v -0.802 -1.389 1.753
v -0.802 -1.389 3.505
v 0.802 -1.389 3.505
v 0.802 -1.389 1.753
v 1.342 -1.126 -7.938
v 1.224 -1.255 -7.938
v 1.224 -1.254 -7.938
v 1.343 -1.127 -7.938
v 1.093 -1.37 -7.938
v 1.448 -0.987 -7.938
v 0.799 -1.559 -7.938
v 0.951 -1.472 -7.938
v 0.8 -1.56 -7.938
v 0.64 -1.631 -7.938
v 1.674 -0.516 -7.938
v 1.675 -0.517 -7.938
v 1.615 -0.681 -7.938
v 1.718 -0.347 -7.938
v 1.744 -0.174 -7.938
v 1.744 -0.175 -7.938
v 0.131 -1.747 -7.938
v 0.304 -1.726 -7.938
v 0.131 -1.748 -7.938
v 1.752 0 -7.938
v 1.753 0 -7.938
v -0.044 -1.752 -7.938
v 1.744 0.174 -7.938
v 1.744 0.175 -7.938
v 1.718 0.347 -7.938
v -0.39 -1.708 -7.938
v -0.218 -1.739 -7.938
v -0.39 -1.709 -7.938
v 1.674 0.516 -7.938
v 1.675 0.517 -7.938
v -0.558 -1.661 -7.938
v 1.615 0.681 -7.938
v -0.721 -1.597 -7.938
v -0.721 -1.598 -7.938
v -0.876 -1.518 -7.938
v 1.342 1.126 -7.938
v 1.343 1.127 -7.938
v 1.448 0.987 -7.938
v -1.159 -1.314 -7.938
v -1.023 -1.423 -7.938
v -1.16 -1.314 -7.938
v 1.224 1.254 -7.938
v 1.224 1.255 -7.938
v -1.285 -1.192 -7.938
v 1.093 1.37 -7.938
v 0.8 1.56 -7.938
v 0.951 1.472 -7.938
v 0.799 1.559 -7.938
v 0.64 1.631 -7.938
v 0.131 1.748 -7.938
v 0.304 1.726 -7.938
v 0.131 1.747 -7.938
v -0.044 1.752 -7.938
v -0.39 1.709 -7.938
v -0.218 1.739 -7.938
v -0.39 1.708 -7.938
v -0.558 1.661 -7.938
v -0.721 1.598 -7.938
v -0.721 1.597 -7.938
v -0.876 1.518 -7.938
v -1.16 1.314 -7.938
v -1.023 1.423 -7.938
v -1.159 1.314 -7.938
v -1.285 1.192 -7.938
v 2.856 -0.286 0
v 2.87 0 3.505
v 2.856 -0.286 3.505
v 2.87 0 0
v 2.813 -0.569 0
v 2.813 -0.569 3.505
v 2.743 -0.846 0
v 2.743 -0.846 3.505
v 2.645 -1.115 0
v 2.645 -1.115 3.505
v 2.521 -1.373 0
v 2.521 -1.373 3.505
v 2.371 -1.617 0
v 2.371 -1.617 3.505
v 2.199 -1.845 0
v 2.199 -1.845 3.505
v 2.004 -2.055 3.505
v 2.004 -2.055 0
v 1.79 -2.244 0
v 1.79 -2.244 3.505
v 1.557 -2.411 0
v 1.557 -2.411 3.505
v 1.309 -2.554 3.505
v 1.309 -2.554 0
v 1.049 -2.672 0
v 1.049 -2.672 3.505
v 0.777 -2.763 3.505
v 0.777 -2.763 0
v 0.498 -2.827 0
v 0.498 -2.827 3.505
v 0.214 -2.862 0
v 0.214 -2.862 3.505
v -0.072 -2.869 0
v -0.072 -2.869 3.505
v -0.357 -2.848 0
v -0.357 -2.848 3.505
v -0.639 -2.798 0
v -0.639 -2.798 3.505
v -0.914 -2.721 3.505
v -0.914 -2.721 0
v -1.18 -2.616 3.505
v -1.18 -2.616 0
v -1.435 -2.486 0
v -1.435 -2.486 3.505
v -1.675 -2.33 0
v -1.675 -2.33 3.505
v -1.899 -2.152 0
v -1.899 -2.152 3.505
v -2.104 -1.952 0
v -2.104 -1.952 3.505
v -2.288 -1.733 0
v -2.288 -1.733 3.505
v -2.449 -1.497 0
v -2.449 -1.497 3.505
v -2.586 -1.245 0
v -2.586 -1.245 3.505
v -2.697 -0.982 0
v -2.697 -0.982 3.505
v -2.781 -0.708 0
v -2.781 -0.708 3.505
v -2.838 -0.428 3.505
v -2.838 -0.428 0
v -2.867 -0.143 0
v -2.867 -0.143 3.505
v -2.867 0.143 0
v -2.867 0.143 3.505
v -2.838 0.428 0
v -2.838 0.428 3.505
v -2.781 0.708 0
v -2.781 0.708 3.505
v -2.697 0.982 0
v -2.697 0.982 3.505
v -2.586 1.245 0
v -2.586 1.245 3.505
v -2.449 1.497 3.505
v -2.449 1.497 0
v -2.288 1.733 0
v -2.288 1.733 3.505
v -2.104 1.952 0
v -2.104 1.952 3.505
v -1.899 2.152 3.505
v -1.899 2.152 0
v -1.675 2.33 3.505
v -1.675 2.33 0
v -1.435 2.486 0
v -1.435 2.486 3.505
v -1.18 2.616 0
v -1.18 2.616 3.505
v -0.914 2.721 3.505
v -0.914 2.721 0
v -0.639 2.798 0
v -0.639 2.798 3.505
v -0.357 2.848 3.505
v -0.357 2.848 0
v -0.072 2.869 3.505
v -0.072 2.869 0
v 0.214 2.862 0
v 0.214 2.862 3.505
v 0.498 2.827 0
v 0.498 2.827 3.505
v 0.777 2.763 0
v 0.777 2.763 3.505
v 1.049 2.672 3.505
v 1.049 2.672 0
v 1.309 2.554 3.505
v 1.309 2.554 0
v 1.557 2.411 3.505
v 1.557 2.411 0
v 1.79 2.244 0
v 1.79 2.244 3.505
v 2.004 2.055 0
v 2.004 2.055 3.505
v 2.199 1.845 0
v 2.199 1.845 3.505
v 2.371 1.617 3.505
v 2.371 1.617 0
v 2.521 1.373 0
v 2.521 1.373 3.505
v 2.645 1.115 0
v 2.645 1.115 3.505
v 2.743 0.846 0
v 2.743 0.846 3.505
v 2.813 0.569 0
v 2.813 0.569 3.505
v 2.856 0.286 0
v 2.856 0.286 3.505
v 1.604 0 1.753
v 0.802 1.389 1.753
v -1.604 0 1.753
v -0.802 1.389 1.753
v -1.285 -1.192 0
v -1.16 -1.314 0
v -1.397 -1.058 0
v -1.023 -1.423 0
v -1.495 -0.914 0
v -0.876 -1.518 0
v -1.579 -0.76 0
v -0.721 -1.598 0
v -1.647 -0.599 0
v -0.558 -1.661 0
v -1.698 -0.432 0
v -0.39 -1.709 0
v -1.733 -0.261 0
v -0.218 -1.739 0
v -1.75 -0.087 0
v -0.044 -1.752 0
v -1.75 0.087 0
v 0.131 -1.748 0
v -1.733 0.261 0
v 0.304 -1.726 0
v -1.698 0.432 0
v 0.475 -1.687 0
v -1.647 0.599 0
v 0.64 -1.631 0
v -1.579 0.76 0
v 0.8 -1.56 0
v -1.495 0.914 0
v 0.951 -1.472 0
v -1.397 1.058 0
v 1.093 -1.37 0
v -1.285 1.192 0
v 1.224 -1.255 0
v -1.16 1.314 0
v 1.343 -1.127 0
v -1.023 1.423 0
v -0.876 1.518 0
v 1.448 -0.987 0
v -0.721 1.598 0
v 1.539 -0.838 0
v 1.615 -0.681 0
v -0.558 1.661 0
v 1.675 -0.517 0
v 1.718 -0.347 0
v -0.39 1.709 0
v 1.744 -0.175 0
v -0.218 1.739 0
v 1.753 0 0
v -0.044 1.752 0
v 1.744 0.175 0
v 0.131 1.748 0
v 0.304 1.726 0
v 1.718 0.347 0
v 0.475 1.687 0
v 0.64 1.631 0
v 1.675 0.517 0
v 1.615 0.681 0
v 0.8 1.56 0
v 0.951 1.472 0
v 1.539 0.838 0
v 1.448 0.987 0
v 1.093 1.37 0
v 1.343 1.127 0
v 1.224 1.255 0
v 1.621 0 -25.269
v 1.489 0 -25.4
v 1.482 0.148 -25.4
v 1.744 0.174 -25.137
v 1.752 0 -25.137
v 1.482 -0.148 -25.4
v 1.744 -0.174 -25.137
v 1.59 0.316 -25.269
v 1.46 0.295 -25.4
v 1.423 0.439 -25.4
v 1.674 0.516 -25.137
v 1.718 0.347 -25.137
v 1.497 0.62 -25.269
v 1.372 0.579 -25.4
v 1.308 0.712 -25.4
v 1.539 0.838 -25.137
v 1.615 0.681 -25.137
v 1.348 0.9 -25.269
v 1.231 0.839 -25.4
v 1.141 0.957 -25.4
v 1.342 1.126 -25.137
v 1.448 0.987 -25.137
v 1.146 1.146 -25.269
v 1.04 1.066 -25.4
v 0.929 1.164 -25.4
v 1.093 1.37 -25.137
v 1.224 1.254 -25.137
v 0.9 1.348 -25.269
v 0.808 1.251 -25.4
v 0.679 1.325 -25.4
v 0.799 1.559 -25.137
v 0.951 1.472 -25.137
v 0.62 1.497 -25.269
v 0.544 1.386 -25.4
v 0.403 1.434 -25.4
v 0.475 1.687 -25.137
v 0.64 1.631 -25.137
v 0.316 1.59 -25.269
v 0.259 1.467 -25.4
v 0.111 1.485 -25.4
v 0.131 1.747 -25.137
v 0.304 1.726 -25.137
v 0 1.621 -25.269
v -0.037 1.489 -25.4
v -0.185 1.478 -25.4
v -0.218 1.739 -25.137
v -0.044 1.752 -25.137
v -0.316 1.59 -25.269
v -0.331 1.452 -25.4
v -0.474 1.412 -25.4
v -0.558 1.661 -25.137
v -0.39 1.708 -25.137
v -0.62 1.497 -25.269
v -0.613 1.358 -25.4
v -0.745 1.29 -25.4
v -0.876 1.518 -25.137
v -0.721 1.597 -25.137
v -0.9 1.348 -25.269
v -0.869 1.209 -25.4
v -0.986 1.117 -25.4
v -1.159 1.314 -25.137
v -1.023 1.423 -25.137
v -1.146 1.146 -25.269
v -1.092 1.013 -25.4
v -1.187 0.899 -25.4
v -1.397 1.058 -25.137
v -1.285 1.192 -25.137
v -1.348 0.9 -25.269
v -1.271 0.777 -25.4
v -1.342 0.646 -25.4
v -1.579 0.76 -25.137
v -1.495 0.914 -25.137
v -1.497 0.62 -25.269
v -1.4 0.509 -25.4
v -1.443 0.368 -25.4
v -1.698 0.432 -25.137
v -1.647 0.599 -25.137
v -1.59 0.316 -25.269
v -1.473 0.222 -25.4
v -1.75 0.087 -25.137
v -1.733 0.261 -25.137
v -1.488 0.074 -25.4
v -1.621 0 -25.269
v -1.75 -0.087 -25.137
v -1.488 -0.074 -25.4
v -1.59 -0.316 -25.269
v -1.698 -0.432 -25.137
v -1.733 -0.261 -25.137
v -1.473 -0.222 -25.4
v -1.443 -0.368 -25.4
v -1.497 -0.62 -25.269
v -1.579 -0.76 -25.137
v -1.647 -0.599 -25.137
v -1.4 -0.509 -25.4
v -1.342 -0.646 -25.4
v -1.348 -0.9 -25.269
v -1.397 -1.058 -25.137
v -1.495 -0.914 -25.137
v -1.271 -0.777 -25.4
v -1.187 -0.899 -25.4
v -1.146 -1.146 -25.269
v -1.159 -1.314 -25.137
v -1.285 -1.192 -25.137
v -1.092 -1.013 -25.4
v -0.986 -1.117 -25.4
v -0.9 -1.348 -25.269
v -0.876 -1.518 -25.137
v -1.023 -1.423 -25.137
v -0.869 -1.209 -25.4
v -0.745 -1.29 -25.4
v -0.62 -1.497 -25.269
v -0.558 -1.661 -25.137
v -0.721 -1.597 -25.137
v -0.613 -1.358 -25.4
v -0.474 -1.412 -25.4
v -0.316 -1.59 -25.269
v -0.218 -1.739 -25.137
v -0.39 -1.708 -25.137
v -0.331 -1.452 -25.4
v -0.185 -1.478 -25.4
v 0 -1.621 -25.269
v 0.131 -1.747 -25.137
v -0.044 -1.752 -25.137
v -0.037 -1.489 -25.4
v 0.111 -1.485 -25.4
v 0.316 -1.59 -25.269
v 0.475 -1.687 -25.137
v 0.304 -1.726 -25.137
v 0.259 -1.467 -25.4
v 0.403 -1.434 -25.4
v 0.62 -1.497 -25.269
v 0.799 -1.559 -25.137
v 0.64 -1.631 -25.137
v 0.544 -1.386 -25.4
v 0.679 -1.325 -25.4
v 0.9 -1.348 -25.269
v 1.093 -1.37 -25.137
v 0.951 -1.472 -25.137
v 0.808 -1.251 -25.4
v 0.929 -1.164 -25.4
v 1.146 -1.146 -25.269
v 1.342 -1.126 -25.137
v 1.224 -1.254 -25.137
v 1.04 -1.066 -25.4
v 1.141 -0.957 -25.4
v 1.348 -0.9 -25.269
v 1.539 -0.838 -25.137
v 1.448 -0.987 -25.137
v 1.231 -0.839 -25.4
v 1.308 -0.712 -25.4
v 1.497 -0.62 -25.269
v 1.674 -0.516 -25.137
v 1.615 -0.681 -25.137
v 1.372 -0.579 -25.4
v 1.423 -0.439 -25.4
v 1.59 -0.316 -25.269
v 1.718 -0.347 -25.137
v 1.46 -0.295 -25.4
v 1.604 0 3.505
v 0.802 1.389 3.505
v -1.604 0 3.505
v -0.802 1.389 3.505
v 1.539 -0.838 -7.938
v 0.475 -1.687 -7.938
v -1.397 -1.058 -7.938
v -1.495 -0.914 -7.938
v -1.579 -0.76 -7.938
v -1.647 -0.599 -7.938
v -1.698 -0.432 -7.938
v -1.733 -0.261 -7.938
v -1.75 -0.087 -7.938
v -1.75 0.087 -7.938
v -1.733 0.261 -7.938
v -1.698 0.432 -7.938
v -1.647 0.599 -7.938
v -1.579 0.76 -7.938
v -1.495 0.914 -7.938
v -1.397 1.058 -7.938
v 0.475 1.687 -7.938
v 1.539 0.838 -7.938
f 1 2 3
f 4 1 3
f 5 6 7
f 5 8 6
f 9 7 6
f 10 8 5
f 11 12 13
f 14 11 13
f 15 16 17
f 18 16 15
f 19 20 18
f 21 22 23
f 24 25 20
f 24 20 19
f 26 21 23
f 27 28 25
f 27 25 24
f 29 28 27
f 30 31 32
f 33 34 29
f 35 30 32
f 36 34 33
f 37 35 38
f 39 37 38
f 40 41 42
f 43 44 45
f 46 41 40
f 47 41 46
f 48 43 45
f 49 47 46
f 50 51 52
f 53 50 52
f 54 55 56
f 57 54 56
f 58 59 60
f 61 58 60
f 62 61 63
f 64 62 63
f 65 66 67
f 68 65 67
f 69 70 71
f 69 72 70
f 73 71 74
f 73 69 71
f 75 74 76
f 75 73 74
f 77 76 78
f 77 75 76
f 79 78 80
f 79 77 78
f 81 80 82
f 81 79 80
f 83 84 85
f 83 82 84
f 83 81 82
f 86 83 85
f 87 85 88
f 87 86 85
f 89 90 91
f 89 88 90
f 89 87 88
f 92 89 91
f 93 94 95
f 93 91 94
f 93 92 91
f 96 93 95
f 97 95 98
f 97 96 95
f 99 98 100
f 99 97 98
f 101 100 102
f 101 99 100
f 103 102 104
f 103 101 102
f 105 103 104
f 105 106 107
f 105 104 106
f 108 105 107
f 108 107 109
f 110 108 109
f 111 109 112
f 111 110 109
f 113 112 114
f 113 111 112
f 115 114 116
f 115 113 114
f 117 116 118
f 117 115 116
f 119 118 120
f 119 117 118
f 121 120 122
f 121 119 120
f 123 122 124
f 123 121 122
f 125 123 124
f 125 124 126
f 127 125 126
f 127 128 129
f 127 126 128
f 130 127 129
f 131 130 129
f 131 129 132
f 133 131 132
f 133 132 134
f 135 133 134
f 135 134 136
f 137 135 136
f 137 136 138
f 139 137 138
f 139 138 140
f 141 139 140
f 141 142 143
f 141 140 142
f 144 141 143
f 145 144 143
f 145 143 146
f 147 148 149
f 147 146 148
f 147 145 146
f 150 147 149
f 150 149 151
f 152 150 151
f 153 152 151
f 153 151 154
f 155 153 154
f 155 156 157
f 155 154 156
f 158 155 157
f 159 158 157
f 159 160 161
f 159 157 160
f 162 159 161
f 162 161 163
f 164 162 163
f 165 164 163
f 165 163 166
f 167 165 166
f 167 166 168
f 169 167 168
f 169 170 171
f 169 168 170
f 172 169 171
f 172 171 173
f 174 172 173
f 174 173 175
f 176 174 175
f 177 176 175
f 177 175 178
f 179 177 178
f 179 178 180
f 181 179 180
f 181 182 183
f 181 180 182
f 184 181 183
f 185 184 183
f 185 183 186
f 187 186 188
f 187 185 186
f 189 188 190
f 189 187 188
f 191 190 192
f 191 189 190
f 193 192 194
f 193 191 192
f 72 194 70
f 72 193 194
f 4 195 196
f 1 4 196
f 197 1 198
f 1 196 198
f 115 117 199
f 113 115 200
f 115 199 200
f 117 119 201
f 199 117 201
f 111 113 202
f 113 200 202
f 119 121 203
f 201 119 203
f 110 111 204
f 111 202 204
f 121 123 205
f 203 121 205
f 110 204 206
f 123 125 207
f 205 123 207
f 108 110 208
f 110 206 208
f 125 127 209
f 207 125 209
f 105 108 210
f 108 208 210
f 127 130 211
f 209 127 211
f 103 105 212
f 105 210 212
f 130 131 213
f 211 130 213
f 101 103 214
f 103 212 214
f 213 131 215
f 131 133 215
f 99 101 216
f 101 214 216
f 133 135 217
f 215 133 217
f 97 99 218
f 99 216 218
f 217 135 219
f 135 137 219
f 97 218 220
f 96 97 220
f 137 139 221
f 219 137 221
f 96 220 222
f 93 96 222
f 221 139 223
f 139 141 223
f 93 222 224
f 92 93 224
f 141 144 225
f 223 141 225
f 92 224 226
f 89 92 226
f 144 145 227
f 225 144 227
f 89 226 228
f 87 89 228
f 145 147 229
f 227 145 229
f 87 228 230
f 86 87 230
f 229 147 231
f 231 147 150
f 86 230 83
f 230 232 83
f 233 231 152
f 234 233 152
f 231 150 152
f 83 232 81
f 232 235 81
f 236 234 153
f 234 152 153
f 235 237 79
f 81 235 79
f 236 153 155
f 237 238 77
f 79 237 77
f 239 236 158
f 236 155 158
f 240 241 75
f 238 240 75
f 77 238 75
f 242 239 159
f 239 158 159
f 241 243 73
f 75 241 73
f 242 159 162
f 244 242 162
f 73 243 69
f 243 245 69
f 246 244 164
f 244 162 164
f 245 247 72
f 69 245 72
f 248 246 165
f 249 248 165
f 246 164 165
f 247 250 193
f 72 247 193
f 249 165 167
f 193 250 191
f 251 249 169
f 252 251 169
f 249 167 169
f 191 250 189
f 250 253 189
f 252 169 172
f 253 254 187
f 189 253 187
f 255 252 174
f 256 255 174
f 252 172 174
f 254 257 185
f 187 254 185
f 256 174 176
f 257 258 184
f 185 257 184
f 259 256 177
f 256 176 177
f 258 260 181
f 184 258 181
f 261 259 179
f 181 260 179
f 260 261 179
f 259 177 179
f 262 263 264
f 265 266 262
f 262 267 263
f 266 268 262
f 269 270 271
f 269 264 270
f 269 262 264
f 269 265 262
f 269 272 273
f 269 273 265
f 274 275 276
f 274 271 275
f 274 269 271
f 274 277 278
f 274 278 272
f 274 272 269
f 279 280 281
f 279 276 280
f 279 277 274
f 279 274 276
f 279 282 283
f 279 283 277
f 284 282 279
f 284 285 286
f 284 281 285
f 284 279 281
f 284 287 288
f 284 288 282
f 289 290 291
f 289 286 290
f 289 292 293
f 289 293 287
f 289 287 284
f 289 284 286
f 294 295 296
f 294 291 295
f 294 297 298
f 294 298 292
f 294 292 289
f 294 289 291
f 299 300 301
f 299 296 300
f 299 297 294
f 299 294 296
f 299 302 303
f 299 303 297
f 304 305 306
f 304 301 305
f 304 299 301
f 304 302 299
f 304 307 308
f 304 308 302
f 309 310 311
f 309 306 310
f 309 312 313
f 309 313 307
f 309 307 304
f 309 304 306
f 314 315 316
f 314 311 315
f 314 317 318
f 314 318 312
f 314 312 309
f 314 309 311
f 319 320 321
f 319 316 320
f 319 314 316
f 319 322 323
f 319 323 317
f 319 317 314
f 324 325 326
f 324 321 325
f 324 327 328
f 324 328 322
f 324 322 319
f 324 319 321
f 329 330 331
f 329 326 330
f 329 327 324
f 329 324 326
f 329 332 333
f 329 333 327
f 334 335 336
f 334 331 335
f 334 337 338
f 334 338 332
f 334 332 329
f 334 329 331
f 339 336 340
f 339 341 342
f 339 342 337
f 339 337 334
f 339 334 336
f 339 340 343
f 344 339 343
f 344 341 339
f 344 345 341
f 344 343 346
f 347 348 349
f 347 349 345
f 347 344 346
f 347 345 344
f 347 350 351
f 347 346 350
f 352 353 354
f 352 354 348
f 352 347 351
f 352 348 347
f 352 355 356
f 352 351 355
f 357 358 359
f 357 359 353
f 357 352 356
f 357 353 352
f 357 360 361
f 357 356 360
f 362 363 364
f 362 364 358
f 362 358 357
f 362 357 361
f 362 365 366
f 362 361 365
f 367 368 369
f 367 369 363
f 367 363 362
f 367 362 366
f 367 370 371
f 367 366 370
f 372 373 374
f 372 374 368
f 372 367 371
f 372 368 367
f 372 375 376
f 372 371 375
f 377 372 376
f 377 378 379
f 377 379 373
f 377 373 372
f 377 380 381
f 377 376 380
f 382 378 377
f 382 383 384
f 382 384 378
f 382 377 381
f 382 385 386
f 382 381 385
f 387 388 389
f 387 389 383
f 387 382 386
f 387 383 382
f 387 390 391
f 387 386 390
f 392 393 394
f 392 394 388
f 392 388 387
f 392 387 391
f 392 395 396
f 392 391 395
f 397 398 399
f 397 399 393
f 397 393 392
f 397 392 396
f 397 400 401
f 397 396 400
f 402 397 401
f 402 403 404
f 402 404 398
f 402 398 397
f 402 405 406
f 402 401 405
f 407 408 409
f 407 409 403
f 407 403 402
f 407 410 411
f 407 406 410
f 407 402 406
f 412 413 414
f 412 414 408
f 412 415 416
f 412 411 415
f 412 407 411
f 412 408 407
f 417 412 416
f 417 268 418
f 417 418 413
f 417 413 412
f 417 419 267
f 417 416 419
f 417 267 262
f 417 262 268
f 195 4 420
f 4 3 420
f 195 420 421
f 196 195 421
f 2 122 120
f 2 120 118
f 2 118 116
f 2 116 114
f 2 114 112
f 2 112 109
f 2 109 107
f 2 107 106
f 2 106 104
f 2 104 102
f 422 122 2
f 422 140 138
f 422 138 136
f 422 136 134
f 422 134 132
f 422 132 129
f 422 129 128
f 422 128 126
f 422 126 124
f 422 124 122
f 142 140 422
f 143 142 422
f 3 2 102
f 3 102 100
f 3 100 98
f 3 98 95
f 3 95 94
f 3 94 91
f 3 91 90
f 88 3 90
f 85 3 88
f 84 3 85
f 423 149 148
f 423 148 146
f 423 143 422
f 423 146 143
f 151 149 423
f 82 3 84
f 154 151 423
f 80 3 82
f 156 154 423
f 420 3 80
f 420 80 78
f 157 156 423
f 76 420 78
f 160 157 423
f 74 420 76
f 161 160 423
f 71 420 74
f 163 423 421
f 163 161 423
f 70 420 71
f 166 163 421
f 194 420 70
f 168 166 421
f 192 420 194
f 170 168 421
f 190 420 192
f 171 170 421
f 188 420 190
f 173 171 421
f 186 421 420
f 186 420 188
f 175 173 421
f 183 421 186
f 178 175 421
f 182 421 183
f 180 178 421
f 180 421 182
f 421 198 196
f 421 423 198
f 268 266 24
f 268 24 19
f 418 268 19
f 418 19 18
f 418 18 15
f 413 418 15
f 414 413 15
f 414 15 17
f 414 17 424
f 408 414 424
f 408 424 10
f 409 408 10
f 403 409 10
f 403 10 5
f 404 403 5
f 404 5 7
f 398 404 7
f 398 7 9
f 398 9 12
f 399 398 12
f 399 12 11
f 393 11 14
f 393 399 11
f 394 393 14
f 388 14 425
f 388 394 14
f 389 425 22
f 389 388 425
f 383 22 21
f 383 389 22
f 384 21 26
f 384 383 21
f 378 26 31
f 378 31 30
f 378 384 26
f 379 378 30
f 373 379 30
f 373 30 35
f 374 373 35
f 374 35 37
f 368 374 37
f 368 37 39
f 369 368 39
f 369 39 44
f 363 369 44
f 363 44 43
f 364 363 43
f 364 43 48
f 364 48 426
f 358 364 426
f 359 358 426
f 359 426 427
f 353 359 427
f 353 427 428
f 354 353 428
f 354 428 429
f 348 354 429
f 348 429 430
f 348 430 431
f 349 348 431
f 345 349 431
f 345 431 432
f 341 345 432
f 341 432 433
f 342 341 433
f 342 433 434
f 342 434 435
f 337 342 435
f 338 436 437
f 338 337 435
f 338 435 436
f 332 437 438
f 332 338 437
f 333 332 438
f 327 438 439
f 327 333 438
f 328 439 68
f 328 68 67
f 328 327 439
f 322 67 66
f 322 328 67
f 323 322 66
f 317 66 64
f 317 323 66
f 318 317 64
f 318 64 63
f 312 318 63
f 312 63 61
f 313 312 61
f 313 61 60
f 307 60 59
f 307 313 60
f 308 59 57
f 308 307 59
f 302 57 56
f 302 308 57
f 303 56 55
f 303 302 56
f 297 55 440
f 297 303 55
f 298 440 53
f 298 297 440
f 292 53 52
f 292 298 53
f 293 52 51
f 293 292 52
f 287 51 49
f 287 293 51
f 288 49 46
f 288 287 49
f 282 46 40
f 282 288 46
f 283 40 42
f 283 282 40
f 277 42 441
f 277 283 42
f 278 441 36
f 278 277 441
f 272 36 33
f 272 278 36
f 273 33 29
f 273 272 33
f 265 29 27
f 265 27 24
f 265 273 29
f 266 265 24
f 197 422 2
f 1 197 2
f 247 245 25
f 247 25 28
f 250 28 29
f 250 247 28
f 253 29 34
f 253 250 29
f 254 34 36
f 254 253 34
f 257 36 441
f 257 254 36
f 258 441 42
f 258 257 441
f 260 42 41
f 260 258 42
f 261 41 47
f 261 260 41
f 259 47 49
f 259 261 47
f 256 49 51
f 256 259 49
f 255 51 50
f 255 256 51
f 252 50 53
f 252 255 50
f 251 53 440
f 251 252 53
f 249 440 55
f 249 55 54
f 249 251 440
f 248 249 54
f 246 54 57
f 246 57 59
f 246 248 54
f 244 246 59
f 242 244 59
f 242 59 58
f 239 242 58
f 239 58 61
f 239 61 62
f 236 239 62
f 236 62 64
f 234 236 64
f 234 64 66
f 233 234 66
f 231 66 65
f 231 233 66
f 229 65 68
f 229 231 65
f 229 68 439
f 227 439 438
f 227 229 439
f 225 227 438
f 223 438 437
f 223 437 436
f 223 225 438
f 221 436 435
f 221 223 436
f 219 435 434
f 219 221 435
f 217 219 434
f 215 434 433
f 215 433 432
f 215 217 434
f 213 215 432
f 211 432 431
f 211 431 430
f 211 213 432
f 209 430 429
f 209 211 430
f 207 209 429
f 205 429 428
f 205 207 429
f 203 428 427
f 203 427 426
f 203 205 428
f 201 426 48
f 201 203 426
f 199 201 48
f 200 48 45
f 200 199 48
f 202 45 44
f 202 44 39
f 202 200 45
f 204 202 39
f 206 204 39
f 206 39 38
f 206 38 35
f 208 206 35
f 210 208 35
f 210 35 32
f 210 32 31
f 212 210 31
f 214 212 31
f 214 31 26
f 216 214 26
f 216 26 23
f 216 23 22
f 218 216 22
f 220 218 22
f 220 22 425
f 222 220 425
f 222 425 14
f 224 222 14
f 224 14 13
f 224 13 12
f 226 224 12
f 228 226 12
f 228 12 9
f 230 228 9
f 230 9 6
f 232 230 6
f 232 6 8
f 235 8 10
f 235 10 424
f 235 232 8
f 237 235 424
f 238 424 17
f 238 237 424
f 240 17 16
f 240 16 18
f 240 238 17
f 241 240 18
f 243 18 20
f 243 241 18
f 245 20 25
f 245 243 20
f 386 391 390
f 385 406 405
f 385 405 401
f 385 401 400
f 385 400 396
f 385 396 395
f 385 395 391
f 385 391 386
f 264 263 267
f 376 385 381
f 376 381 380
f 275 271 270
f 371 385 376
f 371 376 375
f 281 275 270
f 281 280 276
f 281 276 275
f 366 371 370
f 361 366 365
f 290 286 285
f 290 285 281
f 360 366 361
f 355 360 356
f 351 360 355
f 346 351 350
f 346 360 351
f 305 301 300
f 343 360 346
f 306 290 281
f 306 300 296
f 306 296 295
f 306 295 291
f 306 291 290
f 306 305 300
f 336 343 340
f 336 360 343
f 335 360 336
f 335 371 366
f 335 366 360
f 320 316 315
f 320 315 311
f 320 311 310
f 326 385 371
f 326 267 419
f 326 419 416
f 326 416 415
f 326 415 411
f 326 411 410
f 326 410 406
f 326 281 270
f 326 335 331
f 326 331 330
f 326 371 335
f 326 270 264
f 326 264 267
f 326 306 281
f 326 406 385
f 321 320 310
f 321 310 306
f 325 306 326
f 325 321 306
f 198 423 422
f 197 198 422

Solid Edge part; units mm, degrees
sketch "Sketch1" plane through (0, 0, 0) normal (0, 0, 1) x (1, 0, 0)
  circle A0 centre (0, 0) radius 2.8702
  dimension "D1" = 5.7404
extrude "Protrusion1" add sketch "Sketch1" along normal blind 3.5052
sketch "Sketch2" plane through (0, 0, 0) normal (0, 0, -1) x (1, 0, 0)
  circle A0 centre (0, 0) radius 1.7526
extrude "Protrusion2" add sketch "Sketch2" along normal blind 25.4
sketch "Sketch3" plane through (0, 0, -25.4) normal (0, 0, -1) x (1, 0, 0)
  circle A0 centre (0, 0) radius 1.7523
extrude "Cutout1" cut sketch "Sketch3" against normal blind 17.4625 flip side to cut
chamfer "Chamfer_1" distance 0.2629 angle 45 1 edges at (-1.7523, 0, -25.4)
sketch "Sketch4" plane through (0, 0, 3.5052) normal (0, 0, 1) x (1, 0, 0)
  line L0 (-0.802, 1.3891) -> (0.802, 1.3891)
  line L1 (1.604, 0) -> (0.802, 1.3891)
  line L2 (0.802, -1.3891) -> (1.604, 0)
  line L3 (-0.802, -1.3891) -> (0.802, -1.3891)
  line L4 (-1.604, 0) -> (-0.802, -1.3891)
  line L5 (-0.802, 1.3891) -> (-1.604, 0)
  dimension "D1" = 2.7781
extrude "Cutout2" cut sketch "Sketch4" against normal blind 1.7526
properties part number "24101587"
